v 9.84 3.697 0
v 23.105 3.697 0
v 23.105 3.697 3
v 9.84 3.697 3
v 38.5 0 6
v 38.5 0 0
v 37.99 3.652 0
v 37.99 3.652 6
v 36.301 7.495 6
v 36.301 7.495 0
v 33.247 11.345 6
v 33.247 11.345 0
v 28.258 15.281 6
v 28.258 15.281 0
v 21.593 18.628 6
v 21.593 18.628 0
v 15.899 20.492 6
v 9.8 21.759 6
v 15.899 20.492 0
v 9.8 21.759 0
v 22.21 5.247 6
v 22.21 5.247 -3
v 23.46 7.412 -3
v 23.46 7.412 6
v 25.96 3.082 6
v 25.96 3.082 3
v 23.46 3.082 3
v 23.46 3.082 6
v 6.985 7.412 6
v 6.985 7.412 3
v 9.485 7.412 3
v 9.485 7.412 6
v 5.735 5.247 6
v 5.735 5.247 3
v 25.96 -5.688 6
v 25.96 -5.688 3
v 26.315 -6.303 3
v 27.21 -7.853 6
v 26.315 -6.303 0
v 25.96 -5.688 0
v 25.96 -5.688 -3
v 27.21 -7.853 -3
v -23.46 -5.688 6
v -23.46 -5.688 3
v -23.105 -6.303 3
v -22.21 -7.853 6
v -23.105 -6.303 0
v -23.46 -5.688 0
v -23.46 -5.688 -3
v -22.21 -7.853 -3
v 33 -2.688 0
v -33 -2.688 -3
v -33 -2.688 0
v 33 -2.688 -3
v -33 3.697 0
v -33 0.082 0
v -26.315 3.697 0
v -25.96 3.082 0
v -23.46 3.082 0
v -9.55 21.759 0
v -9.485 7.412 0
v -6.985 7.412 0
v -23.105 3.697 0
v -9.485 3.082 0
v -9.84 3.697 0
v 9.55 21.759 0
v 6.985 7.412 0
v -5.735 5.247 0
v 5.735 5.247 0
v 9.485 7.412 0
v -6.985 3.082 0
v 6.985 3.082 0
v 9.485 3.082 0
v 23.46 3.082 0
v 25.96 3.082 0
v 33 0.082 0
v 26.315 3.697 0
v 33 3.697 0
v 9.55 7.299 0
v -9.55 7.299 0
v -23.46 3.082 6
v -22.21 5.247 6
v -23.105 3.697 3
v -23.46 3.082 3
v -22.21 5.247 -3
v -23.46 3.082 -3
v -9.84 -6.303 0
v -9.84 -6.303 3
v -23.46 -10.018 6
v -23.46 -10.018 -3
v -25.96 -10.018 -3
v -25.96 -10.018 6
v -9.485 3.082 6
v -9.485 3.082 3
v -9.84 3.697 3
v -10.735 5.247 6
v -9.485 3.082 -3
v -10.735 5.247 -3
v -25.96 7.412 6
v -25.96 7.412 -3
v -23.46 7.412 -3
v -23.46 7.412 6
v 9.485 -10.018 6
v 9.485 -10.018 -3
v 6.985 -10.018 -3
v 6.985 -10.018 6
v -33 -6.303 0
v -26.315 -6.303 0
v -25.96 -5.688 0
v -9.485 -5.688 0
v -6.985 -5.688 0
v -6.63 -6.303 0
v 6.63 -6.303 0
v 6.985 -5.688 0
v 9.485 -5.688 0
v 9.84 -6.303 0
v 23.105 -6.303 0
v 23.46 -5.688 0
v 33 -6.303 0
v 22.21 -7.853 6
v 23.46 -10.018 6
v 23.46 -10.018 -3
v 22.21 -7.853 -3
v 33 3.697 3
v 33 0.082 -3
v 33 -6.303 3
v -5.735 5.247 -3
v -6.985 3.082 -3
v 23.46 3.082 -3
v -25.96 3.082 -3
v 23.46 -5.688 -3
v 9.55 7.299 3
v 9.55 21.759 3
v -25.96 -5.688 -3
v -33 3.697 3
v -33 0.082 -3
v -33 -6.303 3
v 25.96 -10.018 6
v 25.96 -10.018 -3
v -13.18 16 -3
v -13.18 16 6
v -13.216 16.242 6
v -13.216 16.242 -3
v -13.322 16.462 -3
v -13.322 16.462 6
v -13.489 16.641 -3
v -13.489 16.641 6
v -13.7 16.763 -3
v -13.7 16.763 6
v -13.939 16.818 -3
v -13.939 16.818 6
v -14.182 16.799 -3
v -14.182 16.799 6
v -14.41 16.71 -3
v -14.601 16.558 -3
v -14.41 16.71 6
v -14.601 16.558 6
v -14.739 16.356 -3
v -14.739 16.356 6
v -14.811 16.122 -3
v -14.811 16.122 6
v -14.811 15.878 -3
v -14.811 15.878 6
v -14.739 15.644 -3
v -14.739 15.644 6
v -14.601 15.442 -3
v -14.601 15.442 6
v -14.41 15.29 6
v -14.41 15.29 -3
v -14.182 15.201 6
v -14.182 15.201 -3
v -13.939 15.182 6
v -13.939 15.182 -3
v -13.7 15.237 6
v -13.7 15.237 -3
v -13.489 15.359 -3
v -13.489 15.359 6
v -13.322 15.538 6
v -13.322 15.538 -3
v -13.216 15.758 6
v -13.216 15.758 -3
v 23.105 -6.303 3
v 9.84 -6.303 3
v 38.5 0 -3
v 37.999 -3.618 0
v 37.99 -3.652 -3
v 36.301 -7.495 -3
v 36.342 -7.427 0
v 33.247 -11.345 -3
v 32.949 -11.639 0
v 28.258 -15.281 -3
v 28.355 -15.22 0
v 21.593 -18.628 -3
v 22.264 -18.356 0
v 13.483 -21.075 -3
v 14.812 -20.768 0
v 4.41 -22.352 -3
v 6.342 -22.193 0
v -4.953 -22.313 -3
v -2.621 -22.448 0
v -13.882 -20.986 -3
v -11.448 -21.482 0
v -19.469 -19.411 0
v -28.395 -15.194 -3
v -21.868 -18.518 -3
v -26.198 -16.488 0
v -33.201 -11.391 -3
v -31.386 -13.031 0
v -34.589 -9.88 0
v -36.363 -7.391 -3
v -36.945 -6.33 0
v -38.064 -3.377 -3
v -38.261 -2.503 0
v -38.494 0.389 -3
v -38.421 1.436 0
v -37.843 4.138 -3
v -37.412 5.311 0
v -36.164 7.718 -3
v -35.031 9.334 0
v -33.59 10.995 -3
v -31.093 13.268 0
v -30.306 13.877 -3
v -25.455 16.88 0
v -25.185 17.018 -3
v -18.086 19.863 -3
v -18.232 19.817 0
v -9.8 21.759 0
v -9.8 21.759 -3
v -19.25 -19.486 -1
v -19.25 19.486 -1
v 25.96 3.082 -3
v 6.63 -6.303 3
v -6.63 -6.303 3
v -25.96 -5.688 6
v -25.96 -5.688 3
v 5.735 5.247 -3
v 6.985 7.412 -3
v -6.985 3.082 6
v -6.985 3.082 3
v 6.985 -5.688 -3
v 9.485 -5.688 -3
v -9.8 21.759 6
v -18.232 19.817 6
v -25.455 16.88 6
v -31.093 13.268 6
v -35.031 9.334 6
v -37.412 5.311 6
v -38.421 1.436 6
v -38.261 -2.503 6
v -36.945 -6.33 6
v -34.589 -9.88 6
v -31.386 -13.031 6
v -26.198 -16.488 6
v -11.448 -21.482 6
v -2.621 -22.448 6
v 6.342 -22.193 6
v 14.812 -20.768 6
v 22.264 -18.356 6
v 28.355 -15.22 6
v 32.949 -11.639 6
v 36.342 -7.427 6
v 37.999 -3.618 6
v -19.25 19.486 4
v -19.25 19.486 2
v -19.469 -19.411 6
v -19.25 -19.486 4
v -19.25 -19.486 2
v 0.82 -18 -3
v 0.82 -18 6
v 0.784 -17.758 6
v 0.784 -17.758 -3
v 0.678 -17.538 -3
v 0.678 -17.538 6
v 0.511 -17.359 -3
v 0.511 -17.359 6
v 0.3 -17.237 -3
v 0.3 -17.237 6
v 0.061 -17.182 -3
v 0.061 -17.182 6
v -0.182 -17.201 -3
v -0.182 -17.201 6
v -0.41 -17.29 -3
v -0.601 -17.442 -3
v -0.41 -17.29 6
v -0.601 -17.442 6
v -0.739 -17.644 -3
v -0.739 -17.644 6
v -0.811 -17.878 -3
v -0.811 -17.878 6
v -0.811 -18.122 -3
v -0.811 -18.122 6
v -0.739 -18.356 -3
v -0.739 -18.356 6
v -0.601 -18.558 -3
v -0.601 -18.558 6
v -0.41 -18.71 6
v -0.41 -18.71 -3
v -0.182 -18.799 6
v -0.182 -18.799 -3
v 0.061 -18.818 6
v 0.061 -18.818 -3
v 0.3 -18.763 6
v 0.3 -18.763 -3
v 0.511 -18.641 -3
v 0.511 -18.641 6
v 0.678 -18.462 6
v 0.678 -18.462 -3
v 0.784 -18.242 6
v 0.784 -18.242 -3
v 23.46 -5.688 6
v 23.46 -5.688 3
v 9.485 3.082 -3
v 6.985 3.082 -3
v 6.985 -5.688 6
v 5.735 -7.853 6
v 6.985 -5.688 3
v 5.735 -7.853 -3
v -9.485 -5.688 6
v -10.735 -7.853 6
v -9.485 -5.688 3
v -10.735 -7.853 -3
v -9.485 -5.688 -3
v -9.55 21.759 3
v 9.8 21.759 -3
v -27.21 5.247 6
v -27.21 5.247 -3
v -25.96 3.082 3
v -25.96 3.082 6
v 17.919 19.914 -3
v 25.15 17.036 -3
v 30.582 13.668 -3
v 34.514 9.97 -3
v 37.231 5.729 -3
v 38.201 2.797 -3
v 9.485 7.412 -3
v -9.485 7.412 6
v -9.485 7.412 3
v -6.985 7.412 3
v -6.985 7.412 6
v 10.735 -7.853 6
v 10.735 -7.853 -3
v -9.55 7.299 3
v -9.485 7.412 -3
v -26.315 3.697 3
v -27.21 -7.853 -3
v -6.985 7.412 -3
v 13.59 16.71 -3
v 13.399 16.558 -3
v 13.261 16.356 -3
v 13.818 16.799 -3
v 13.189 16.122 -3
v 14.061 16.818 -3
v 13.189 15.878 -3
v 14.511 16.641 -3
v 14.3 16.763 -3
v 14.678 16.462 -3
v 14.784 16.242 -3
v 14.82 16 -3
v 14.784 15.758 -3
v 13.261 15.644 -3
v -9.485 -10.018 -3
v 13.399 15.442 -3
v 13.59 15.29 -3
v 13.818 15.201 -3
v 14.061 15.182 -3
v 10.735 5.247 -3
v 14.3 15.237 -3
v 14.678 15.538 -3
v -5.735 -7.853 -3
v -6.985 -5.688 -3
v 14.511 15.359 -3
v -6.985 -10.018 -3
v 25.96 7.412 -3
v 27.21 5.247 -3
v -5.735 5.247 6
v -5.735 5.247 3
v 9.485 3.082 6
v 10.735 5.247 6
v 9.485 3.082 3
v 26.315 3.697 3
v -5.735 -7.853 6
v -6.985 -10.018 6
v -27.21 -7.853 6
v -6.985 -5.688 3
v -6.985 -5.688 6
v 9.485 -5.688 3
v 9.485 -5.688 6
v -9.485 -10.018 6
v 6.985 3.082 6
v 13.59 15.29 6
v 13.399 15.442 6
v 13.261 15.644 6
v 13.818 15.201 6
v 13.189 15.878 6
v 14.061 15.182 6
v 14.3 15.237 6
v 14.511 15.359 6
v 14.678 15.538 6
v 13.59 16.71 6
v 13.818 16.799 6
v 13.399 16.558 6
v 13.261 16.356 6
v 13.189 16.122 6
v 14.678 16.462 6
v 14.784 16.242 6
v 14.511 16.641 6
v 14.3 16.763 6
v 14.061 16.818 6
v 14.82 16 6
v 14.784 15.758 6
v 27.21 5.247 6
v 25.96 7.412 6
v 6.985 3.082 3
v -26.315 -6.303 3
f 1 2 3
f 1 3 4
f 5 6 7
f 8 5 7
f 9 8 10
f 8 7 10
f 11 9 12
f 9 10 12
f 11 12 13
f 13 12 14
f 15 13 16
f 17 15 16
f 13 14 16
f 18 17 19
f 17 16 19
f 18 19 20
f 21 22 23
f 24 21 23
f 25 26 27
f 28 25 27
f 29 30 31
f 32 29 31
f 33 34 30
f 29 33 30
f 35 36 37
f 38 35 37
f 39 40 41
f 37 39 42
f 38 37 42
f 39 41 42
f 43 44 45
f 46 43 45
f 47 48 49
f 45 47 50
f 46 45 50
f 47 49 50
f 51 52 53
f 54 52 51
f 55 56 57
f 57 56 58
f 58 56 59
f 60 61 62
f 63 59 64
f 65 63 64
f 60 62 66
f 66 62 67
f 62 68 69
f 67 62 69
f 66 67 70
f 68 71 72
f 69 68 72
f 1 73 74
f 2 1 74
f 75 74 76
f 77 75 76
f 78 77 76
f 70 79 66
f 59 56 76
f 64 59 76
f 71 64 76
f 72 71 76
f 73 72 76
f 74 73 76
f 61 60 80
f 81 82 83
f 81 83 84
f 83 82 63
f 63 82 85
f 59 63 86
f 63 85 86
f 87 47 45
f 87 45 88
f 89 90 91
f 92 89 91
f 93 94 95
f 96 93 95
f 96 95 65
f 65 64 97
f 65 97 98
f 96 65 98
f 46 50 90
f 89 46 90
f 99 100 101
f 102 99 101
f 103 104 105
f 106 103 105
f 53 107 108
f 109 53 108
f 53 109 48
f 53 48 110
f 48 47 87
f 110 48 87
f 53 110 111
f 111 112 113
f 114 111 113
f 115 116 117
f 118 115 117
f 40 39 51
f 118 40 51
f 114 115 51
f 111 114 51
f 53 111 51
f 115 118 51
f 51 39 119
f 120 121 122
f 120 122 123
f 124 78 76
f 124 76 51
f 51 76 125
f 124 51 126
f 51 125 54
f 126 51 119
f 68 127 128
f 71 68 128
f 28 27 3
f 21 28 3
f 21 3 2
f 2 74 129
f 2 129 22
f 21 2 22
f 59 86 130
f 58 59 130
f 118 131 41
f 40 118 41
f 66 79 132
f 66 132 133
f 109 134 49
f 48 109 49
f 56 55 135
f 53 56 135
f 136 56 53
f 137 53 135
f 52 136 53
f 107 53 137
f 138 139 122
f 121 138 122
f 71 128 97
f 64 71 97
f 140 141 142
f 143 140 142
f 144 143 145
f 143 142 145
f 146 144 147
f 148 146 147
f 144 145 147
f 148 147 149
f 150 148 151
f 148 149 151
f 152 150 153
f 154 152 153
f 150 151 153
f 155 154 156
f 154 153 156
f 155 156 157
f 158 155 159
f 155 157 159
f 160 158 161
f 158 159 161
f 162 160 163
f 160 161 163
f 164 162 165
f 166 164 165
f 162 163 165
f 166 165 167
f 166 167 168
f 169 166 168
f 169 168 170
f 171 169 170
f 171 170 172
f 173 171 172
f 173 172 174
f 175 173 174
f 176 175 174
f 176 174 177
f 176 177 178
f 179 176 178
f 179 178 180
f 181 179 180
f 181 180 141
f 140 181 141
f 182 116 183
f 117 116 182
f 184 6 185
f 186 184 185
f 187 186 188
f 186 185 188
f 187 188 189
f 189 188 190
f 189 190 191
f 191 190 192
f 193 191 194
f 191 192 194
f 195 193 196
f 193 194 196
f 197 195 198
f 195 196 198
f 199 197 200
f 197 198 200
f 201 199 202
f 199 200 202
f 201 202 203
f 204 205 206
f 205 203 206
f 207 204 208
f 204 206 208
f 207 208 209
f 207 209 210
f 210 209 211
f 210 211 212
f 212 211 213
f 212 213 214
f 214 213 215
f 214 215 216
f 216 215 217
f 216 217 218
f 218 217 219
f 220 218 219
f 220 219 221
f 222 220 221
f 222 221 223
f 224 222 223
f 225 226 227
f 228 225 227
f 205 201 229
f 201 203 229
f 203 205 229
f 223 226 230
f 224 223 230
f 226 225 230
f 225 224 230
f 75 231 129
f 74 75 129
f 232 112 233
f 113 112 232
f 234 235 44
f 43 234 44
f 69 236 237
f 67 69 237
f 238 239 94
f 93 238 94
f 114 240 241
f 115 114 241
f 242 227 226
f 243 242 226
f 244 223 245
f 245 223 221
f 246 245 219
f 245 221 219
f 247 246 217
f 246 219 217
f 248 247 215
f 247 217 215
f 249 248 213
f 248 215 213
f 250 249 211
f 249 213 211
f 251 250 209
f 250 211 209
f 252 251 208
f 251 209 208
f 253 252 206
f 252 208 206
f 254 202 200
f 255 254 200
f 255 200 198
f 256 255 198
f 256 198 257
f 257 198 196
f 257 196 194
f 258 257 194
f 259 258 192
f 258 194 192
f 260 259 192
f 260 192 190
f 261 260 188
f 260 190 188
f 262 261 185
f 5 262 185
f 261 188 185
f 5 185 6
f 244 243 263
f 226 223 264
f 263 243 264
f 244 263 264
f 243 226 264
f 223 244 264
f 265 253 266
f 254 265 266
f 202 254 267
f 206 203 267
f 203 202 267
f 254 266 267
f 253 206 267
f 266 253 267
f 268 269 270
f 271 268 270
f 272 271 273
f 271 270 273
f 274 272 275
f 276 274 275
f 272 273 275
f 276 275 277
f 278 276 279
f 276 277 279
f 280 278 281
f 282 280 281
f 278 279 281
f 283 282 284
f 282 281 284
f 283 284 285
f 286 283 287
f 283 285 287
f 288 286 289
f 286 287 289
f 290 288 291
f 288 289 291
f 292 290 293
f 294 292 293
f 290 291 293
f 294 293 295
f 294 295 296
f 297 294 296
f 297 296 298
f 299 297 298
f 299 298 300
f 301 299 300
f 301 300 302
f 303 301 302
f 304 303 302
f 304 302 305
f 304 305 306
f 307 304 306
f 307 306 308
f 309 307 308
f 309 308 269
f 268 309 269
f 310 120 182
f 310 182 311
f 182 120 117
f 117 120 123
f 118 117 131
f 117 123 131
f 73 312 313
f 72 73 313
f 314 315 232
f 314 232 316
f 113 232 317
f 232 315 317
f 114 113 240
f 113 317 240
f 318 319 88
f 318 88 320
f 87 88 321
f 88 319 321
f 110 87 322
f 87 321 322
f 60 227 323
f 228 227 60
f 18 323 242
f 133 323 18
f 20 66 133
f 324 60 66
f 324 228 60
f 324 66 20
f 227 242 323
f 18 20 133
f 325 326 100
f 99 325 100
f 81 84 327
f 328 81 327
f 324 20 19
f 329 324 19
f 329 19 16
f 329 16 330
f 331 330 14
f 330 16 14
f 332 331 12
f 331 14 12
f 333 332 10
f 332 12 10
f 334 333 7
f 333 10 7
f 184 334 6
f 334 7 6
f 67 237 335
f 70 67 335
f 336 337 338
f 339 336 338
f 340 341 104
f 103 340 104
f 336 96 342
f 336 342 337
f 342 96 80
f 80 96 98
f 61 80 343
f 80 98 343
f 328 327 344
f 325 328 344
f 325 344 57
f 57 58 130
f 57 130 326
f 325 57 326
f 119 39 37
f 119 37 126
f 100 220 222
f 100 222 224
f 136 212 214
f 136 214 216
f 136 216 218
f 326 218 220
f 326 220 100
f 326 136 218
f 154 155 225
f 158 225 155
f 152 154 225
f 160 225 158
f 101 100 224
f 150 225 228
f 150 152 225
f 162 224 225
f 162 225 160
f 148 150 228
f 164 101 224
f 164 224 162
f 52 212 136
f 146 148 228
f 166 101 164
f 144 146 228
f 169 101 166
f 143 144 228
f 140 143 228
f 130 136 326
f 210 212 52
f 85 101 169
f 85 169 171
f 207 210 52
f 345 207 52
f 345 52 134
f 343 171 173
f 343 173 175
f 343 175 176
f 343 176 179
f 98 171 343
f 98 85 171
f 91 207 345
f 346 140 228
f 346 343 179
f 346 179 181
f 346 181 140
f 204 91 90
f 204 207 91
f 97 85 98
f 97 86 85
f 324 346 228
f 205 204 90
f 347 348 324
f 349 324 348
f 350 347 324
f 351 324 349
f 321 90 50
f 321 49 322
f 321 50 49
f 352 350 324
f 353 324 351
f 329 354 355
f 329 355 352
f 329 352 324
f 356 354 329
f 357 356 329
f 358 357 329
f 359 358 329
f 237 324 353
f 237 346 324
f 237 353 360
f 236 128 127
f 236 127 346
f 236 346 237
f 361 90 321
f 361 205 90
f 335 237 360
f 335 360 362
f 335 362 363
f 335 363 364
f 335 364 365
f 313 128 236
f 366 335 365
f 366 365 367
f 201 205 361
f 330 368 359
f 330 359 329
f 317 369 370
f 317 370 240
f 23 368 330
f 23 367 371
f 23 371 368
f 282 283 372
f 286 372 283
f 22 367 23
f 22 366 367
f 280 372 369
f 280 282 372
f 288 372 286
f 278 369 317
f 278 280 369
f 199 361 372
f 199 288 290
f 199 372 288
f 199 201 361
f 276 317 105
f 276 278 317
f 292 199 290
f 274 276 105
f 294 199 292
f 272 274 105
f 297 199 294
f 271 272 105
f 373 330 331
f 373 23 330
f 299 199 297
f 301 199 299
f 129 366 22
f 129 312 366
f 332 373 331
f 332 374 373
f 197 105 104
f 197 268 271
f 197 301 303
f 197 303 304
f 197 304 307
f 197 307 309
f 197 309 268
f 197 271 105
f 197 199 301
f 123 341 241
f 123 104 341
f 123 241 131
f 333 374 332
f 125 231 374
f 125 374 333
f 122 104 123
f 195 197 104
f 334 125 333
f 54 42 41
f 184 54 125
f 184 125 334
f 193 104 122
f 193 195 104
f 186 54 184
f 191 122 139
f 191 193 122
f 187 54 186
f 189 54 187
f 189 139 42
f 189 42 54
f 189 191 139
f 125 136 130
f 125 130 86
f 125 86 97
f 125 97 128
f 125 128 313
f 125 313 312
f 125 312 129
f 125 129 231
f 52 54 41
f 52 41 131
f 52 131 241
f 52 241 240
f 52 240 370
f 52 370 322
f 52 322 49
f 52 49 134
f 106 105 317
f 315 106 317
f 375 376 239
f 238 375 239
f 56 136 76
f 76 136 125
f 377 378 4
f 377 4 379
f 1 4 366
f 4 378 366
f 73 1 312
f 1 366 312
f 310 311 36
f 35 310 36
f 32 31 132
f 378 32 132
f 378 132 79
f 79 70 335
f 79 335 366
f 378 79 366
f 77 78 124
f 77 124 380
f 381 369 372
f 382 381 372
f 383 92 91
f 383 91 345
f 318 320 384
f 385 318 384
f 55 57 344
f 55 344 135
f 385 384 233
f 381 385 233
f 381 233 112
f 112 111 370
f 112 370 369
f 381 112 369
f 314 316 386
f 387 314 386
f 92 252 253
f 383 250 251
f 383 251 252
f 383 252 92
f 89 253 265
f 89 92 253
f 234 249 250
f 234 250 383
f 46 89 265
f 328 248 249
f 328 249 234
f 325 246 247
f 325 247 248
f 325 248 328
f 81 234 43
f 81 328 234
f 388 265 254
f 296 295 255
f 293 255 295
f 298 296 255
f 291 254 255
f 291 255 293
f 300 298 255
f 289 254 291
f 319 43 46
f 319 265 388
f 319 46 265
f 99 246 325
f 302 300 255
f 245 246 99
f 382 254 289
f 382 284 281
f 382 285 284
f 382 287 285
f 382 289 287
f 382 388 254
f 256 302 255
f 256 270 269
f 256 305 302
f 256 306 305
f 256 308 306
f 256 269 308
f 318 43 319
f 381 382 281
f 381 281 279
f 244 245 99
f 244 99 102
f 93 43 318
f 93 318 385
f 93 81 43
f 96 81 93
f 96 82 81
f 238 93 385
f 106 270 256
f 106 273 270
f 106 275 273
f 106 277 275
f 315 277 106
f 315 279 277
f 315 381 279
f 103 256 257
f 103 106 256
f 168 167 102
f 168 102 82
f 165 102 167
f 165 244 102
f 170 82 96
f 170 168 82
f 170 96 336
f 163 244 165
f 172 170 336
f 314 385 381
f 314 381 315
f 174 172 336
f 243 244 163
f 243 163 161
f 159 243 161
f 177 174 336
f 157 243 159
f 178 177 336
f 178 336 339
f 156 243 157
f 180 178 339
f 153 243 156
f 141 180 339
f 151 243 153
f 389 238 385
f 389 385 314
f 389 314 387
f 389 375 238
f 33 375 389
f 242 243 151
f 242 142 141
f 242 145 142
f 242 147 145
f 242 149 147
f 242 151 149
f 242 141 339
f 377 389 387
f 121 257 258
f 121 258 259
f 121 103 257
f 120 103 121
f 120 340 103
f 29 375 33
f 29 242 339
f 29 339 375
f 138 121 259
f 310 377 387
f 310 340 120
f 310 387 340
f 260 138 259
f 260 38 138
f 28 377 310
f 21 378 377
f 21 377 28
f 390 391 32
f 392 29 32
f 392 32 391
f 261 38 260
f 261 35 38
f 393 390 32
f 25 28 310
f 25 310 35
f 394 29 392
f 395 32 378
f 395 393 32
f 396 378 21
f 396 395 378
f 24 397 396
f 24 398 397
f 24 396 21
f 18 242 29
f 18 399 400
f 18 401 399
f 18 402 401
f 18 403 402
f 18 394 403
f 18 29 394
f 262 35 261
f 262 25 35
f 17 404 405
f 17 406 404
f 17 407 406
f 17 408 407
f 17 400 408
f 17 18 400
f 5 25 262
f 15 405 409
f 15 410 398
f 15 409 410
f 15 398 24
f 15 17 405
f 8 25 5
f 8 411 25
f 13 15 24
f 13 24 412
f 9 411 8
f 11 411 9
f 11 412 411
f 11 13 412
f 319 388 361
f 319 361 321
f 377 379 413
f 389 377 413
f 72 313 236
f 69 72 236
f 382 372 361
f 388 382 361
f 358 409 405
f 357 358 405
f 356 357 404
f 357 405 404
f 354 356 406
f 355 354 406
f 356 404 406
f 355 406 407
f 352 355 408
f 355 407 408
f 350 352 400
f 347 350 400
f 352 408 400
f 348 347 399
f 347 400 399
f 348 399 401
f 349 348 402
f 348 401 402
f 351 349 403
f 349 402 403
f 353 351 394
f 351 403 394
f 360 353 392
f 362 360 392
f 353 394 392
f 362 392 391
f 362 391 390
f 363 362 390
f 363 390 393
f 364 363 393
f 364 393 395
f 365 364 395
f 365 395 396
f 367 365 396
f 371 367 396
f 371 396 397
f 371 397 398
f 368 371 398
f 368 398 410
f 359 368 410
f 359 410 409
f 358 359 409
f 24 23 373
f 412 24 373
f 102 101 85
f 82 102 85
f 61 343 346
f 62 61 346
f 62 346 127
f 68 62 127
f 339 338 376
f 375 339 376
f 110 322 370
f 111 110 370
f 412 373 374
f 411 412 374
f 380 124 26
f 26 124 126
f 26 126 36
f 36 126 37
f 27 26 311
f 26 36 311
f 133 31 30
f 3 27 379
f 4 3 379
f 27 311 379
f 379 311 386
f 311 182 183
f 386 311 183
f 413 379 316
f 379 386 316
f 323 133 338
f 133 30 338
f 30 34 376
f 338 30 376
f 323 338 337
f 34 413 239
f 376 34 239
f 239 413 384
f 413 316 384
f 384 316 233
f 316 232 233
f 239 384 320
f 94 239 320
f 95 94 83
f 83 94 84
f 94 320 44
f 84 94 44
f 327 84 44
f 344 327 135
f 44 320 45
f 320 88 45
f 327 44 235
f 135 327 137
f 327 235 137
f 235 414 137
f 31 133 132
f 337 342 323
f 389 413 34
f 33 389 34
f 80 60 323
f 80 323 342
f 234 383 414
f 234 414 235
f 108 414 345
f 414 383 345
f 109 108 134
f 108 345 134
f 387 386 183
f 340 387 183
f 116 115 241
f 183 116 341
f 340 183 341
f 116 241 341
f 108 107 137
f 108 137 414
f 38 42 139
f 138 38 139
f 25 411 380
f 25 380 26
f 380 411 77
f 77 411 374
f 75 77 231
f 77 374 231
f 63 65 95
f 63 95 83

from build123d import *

# Parameters (mm, degrees)
PAD_DEPTH       = 6
POCKET_DEPTH    = 3
PAD001_DEPTH    = 3
SKETCH003_W     = 66
SKETCH003_H     = 2.77
POCKET001_DEPTH = 3
SKETCH004_W     = 19.6
SKETCH004_H     = 1
POCKET002_DEPTH = 9.001
SKETCH005_R     = 0.82
POCKET003_DEPTH = 9.001
POCKET004_DEPTH = 9.001


with BuildPart() as part:
    # Sketch → Pad (new body)
    with BuildSketch(Plane.XY):
        with BuildLine():
            add(Edge.make_bspline(
                [(38.5, 0), (38.5, 38.971143), (-19.25, 19.485572), (-77, 0), (-19.25, -19.485572), (38.5, -38.971143), (38.5, 0)],
                knots=[0, 0, 0, 2.094395, 2.094395, 4.18879, 4.18879, 6.283185, 6.283185, 6.283185], degree=2, weights=[1, 0.5, 1, 0.5, 1, 0.5, 1]))
        make_face()
    extrude(amount=PAD_DEPTH)

    # Sketch001 (on Face2 of Pad) → Pocket (cut)
    with BuildSketch(Plane(origin=(0, 0, 0), x_dir=(1, 0, 0), z_dir=(0, 0, -1))):
        Polygon((9.55, -3.696801), (9.55, -21.796801), (-9.55, -21.796801), (-9.55, -3.696801), (-33, -3.696801), (-33, 6.303199), (33, 6.303199), (33, -3.696801), align=None)
    extrude(amount=-POCKET_DEPTH, mode=Mode.SUBTRACT)

    # Sketch002 (on Face2 of Pocket) → Pad001 (join)
    with BuildSketch(Plane(origin=(0, 0, 0), x_dir=(1, 0, 0), z_dir=(0, 0, -1))):
        with BuildLine():
            add(Edge.make_bspline(
                [(38.5, 0), (38.5, 38.971143), (-19.25, 19.485572), (-77, 0), (-19.25, -19.485572), (38.5, -38.971143), (38.5, 0)],
                knots=[0, 0, 0, 2.094395, 2.094395, 4.18879, 4.18879, 6.283185, 6.283185, 6.283185], degree=2, weights=[1, 0.5, 1, 0.5, 1, 0.5, 1]))
        make_face()
    extrude(amount=PAD001_DEPTH)

    # Sketch003 (on Face4 of Pad001) → Pocket001 (cut)
    with BuildSketch(Plane(origin=(0, 0, -3), x_dir=(1, 0, 0), z_dir=(0, 0, -1))):
        with Locations((0, 1.303199)):
            Rectangle(SKETCH003_W, SKETCH003_H)
    extrude(amount=-POCKET001_DEPTH, mode=Mode.SUBTRACT)

    # Sketch004 (on Face4 of Pocket001) → Pocket002 (cut, through all)
    with BuildSketch(Plane(origin=(0, 0, -3), x_dir=(1, 0, 0), z_dir=(0, 0, -1))):
        with Locations((0, -22.258868)):
            Rectangle(SKETCH004_W, SKETCH004_H)
    extrude(amount=-POCKET002_DEPTH, mode=Mode.SUBTRACT)

    # Sketch005 (on Face4 of Pocket002) → Pocket003 (cut, through all)
    with BuildSketch(Plane.XY.offset(6)):
        with Locations((-14, 16)):
            Circle(SKETCH005_R)
        with Locations((14, 16)):
            Circle(SKETCH005_R)
        with Locations((0, -18)):
            Circle(SKETCH005_R)
    extrude(amount=-POCKET003_DEPTH, mode=Mode.SUBTRACT)

    # Sketch006 (on Face7 of Pocket003) → Pocket004 (cut, through all)
    with BuildSketch(Plane(origin=(0, 0, -3), x_dir=(1, 0, 0), z_dir=(0, 0, -1))):
        Polygon((-22.21, -5.246865), (-23.46, -3.081801), (-25.96, -3.081801), (-27.21, -5.246865), (-25.96, -7.411928), (-23.46, -7.411928), align=None)
        Polygon((-23.46, 5.688199), (-22.21, 7.853262), (-23.46, 10.018326), (-25.96, 10.018326), (-27.21, 7.853262), (-25.96, 5.688199), align=None)
        Polygon((-5.735, -5.246865), (-6.985, -3.081801), (-9.485, -3.081801), (-10.735, -5.246865), (-9.485, -7.411928), (-6.985, -7.411928), align=None)
        Polygon((-9.485, 5.688199), (-6.985, 5.688199), (-5.735, 7.853262), (-6.985, 10.018326), (-9.485, 10.018326), (-10.735, 7.853262), align=None)
        Polygon((10.735, -5.246865), (9.485, -3.081801), (6.985, -3.081801), (5.735, -5.246865), (6.985, -7.411928), (9.485, -7.411928), align=None)
        Polygon((9.485, 5.688199), (10.735, 7.853262), (9.485, 10.018326), (6.985, 10.018326), (5.735, 7.853262), (6.985, 5.688199), align=None)
        Polygon((27.21, -5.246865), (25.96, -3.081801), (23.46, -3.081801), (22.21, -5.246865), (23.46, -7.411928), (25.96, -7.411928), align=None)
        Polygon((25.96, 5.688199), (27.21, 7.853262), (25.96, 10.018326), (23.46, 10.018326), (22.21, 7.853262), (23.46, 5.688199), align=None)
    extrude(amount=-POCKET004_DEPTH, mode=Mode.SUBTRACT)


solid = part.part
